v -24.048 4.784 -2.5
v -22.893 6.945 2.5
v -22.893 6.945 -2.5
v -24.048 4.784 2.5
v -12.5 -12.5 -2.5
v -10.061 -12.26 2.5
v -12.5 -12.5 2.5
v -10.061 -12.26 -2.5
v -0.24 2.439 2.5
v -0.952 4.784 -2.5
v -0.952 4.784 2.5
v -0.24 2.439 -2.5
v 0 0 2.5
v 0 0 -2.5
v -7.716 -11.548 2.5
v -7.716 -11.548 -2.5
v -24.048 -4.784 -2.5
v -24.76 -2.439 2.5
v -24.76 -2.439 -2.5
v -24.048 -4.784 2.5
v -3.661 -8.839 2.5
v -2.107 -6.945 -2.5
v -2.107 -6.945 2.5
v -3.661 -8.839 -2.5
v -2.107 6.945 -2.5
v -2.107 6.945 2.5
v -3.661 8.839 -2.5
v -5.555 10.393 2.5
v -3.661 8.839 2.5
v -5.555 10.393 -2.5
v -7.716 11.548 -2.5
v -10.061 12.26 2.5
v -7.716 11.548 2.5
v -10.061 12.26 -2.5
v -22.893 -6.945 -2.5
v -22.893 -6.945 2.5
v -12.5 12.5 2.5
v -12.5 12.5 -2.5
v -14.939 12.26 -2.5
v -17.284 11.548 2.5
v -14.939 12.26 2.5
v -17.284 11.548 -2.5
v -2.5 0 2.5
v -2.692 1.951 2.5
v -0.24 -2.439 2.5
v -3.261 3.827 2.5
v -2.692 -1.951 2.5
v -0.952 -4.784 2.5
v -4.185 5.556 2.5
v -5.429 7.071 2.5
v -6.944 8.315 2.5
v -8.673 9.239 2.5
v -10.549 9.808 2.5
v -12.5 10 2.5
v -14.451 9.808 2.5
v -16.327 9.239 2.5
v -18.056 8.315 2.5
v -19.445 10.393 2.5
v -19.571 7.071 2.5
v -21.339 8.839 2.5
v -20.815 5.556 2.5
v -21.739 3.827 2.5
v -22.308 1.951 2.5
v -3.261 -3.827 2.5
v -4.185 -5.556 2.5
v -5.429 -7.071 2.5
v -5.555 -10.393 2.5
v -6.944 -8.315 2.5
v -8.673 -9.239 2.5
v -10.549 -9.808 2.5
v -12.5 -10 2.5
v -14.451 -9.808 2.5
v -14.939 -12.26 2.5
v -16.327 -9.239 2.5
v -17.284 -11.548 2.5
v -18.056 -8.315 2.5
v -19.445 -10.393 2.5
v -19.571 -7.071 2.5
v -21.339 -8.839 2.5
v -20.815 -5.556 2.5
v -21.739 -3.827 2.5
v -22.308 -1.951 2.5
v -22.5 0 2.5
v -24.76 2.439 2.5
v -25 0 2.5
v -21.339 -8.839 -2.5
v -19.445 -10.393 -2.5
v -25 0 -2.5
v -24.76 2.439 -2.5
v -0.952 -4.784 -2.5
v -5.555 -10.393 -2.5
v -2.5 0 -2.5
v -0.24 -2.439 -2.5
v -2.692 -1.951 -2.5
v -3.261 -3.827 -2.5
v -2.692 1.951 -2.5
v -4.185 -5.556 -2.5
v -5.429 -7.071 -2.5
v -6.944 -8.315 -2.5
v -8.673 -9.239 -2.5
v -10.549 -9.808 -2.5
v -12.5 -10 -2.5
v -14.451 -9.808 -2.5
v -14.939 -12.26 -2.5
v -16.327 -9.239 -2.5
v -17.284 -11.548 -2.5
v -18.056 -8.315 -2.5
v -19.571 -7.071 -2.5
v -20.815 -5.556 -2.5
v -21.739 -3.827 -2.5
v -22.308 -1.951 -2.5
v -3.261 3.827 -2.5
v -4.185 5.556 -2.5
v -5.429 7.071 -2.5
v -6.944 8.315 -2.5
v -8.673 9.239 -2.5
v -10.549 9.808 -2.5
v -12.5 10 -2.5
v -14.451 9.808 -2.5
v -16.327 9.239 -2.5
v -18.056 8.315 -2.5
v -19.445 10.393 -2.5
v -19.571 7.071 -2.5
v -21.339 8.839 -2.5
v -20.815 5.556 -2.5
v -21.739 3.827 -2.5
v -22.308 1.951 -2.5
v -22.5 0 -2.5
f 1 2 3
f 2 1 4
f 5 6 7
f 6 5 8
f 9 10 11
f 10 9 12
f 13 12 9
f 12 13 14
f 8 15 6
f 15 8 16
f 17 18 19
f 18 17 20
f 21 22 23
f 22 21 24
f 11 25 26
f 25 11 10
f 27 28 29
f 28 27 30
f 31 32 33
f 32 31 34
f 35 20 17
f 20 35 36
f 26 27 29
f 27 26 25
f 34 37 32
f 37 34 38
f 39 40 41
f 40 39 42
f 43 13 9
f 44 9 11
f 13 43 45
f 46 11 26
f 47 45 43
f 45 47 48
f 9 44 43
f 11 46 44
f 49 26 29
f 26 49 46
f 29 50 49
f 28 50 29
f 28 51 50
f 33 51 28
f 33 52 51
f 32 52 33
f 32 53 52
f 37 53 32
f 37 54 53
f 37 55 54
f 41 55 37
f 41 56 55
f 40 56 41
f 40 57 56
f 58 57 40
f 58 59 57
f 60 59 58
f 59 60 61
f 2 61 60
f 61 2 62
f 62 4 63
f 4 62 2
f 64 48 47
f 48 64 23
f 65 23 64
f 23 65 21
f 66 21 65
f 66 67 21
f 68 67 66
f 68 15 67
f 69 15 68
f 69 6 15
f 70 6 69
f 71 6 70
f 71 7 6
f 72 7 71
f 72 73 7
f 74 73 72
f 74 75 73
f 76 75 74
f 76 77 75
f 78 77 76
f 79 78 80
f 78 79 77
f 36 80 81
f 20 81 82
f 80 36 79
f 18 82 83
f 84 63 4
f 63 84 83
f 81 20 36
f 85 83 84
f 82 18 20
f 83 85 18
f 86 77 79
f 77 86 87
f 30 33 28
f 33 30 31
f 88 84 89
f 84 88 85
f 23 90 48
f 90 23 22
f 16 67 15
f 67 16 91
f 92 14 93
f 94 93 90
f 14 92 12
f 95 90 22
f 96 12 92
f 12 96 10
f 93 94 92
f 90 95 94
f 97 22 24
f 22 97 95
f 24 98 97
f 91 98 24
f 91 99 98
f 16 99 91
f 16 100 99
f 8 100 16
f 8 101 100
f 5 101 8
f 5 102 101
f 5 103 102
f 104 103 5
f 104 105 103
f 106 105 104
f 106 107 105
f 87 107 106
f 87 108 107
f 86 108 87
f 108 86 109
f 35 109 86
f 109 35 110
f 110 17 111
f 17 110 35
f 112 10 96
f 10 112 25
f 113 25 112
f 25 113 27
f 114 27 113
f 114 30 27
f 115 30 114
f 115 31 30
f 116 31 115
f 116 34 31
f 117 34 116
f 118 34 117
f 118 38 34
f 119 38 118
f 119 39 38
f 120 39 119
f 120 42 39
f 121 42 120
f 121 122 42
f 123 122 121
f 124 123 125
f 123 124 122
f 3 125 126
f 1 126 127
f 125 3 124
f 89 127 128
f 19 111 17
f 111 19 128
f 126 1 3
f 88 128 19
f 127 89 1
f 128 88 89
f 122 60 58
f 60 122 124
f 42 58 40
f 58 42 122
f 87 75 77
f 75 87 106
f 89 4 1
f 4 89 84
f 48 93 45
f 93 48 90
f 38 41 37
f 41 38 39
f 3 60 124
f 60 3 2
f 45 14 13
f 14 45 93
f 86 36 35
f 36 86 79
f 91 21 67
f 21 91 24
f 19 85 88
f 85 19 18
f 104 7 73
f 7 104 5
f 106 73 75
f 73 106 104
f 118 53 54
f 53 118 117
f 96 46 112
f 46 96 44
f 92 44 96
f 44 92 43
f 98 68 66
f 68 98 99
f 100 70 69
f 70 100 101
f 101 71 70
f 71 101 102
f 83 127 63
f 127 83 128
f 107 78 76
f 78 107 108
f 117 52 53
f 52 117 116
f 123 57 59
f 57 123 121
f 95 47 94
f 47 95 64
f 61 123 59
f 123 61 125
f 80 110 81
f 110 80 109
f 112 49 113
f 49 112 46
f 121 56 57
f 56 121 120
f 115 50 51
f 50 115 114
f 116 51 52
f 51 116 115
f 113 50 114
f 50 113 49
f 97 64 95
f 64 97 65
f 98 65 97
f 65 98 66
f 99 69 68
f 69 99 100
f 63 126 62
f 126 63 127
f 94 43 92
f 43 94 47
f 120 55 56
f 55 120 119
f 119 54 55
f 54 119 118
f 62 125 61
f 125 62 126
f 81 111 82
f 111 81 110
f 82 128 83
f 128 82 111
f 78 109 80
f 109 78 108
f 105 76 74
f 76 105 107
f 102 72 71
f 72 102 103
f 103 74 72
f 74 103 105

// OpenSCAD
// file: Cylinder.scad
// Auther: Tobias Grundtvig
// Date: Oct 1, 2020
//
// A wrapper of the build-in cylinder module, to get consistent naming

Cylinder(diameter=10, height=5, t_x="neg", t_z="pos");

module Cylinder(diameter, height, t_x="center", t_y="center", t_z="center", angular_resolution=32)
{
    tx = t_x == "neg" ? -diameter/2 : 
            t_x == "pos" ? diameter/2 : 0;
    ty = t_y == "neg" ? -diameter/2 : 
            t_y == "pos" ? diameter/2 : 0;
    tz = t_z == "neg" ? -height/2 : 
            t_z == "pos" ? height/2 : 0;
    translate([tx,ty,tz])
        cylinder(d=diameter, h=height, center=true, $fn=angular_resolution);
}
// main file
// Auther: Tobias Grundtvig
// Date: Oct 1, 2020
//
// A flat ring

use  <Cylinder.scad>

Flat_Ring(inner_diameter=20, outer_diameter=25, height=5,t_x="neg", angular_resolution=32);

module Flat_Ring(   inner_diameter,
                    outer_diameter,
                    height,
                    t_x="center",
                    t_y="center",
                    t_z="center",
                    angular_resolution=32)
{
    tx = t_x == "neg" ? -outer_diameter/2 : 
            t_x == "pos" ? outer_diameter/2 : 0;
    ty = t_y == "neg" ? -outer_diameter/2 : 
            t_y == "pos" ? outer_diameter/2 : 0;
    tz = t_z == "neg" ? -height/2 : 
            t_z == "pos" ? height/2 : 0;
    translate([tx, ty, tz])
    difference()
    {
        Cylinder(   diameter=outer_diameter,
                    height=height,
                    angular_resolution=angular_resolution   );
        translate([0,0,-1])
        Cylinder(   diameter=inner_diameter,
                    height=height+3, 
                    angular_resolution=angular_resolution);
    }
}
